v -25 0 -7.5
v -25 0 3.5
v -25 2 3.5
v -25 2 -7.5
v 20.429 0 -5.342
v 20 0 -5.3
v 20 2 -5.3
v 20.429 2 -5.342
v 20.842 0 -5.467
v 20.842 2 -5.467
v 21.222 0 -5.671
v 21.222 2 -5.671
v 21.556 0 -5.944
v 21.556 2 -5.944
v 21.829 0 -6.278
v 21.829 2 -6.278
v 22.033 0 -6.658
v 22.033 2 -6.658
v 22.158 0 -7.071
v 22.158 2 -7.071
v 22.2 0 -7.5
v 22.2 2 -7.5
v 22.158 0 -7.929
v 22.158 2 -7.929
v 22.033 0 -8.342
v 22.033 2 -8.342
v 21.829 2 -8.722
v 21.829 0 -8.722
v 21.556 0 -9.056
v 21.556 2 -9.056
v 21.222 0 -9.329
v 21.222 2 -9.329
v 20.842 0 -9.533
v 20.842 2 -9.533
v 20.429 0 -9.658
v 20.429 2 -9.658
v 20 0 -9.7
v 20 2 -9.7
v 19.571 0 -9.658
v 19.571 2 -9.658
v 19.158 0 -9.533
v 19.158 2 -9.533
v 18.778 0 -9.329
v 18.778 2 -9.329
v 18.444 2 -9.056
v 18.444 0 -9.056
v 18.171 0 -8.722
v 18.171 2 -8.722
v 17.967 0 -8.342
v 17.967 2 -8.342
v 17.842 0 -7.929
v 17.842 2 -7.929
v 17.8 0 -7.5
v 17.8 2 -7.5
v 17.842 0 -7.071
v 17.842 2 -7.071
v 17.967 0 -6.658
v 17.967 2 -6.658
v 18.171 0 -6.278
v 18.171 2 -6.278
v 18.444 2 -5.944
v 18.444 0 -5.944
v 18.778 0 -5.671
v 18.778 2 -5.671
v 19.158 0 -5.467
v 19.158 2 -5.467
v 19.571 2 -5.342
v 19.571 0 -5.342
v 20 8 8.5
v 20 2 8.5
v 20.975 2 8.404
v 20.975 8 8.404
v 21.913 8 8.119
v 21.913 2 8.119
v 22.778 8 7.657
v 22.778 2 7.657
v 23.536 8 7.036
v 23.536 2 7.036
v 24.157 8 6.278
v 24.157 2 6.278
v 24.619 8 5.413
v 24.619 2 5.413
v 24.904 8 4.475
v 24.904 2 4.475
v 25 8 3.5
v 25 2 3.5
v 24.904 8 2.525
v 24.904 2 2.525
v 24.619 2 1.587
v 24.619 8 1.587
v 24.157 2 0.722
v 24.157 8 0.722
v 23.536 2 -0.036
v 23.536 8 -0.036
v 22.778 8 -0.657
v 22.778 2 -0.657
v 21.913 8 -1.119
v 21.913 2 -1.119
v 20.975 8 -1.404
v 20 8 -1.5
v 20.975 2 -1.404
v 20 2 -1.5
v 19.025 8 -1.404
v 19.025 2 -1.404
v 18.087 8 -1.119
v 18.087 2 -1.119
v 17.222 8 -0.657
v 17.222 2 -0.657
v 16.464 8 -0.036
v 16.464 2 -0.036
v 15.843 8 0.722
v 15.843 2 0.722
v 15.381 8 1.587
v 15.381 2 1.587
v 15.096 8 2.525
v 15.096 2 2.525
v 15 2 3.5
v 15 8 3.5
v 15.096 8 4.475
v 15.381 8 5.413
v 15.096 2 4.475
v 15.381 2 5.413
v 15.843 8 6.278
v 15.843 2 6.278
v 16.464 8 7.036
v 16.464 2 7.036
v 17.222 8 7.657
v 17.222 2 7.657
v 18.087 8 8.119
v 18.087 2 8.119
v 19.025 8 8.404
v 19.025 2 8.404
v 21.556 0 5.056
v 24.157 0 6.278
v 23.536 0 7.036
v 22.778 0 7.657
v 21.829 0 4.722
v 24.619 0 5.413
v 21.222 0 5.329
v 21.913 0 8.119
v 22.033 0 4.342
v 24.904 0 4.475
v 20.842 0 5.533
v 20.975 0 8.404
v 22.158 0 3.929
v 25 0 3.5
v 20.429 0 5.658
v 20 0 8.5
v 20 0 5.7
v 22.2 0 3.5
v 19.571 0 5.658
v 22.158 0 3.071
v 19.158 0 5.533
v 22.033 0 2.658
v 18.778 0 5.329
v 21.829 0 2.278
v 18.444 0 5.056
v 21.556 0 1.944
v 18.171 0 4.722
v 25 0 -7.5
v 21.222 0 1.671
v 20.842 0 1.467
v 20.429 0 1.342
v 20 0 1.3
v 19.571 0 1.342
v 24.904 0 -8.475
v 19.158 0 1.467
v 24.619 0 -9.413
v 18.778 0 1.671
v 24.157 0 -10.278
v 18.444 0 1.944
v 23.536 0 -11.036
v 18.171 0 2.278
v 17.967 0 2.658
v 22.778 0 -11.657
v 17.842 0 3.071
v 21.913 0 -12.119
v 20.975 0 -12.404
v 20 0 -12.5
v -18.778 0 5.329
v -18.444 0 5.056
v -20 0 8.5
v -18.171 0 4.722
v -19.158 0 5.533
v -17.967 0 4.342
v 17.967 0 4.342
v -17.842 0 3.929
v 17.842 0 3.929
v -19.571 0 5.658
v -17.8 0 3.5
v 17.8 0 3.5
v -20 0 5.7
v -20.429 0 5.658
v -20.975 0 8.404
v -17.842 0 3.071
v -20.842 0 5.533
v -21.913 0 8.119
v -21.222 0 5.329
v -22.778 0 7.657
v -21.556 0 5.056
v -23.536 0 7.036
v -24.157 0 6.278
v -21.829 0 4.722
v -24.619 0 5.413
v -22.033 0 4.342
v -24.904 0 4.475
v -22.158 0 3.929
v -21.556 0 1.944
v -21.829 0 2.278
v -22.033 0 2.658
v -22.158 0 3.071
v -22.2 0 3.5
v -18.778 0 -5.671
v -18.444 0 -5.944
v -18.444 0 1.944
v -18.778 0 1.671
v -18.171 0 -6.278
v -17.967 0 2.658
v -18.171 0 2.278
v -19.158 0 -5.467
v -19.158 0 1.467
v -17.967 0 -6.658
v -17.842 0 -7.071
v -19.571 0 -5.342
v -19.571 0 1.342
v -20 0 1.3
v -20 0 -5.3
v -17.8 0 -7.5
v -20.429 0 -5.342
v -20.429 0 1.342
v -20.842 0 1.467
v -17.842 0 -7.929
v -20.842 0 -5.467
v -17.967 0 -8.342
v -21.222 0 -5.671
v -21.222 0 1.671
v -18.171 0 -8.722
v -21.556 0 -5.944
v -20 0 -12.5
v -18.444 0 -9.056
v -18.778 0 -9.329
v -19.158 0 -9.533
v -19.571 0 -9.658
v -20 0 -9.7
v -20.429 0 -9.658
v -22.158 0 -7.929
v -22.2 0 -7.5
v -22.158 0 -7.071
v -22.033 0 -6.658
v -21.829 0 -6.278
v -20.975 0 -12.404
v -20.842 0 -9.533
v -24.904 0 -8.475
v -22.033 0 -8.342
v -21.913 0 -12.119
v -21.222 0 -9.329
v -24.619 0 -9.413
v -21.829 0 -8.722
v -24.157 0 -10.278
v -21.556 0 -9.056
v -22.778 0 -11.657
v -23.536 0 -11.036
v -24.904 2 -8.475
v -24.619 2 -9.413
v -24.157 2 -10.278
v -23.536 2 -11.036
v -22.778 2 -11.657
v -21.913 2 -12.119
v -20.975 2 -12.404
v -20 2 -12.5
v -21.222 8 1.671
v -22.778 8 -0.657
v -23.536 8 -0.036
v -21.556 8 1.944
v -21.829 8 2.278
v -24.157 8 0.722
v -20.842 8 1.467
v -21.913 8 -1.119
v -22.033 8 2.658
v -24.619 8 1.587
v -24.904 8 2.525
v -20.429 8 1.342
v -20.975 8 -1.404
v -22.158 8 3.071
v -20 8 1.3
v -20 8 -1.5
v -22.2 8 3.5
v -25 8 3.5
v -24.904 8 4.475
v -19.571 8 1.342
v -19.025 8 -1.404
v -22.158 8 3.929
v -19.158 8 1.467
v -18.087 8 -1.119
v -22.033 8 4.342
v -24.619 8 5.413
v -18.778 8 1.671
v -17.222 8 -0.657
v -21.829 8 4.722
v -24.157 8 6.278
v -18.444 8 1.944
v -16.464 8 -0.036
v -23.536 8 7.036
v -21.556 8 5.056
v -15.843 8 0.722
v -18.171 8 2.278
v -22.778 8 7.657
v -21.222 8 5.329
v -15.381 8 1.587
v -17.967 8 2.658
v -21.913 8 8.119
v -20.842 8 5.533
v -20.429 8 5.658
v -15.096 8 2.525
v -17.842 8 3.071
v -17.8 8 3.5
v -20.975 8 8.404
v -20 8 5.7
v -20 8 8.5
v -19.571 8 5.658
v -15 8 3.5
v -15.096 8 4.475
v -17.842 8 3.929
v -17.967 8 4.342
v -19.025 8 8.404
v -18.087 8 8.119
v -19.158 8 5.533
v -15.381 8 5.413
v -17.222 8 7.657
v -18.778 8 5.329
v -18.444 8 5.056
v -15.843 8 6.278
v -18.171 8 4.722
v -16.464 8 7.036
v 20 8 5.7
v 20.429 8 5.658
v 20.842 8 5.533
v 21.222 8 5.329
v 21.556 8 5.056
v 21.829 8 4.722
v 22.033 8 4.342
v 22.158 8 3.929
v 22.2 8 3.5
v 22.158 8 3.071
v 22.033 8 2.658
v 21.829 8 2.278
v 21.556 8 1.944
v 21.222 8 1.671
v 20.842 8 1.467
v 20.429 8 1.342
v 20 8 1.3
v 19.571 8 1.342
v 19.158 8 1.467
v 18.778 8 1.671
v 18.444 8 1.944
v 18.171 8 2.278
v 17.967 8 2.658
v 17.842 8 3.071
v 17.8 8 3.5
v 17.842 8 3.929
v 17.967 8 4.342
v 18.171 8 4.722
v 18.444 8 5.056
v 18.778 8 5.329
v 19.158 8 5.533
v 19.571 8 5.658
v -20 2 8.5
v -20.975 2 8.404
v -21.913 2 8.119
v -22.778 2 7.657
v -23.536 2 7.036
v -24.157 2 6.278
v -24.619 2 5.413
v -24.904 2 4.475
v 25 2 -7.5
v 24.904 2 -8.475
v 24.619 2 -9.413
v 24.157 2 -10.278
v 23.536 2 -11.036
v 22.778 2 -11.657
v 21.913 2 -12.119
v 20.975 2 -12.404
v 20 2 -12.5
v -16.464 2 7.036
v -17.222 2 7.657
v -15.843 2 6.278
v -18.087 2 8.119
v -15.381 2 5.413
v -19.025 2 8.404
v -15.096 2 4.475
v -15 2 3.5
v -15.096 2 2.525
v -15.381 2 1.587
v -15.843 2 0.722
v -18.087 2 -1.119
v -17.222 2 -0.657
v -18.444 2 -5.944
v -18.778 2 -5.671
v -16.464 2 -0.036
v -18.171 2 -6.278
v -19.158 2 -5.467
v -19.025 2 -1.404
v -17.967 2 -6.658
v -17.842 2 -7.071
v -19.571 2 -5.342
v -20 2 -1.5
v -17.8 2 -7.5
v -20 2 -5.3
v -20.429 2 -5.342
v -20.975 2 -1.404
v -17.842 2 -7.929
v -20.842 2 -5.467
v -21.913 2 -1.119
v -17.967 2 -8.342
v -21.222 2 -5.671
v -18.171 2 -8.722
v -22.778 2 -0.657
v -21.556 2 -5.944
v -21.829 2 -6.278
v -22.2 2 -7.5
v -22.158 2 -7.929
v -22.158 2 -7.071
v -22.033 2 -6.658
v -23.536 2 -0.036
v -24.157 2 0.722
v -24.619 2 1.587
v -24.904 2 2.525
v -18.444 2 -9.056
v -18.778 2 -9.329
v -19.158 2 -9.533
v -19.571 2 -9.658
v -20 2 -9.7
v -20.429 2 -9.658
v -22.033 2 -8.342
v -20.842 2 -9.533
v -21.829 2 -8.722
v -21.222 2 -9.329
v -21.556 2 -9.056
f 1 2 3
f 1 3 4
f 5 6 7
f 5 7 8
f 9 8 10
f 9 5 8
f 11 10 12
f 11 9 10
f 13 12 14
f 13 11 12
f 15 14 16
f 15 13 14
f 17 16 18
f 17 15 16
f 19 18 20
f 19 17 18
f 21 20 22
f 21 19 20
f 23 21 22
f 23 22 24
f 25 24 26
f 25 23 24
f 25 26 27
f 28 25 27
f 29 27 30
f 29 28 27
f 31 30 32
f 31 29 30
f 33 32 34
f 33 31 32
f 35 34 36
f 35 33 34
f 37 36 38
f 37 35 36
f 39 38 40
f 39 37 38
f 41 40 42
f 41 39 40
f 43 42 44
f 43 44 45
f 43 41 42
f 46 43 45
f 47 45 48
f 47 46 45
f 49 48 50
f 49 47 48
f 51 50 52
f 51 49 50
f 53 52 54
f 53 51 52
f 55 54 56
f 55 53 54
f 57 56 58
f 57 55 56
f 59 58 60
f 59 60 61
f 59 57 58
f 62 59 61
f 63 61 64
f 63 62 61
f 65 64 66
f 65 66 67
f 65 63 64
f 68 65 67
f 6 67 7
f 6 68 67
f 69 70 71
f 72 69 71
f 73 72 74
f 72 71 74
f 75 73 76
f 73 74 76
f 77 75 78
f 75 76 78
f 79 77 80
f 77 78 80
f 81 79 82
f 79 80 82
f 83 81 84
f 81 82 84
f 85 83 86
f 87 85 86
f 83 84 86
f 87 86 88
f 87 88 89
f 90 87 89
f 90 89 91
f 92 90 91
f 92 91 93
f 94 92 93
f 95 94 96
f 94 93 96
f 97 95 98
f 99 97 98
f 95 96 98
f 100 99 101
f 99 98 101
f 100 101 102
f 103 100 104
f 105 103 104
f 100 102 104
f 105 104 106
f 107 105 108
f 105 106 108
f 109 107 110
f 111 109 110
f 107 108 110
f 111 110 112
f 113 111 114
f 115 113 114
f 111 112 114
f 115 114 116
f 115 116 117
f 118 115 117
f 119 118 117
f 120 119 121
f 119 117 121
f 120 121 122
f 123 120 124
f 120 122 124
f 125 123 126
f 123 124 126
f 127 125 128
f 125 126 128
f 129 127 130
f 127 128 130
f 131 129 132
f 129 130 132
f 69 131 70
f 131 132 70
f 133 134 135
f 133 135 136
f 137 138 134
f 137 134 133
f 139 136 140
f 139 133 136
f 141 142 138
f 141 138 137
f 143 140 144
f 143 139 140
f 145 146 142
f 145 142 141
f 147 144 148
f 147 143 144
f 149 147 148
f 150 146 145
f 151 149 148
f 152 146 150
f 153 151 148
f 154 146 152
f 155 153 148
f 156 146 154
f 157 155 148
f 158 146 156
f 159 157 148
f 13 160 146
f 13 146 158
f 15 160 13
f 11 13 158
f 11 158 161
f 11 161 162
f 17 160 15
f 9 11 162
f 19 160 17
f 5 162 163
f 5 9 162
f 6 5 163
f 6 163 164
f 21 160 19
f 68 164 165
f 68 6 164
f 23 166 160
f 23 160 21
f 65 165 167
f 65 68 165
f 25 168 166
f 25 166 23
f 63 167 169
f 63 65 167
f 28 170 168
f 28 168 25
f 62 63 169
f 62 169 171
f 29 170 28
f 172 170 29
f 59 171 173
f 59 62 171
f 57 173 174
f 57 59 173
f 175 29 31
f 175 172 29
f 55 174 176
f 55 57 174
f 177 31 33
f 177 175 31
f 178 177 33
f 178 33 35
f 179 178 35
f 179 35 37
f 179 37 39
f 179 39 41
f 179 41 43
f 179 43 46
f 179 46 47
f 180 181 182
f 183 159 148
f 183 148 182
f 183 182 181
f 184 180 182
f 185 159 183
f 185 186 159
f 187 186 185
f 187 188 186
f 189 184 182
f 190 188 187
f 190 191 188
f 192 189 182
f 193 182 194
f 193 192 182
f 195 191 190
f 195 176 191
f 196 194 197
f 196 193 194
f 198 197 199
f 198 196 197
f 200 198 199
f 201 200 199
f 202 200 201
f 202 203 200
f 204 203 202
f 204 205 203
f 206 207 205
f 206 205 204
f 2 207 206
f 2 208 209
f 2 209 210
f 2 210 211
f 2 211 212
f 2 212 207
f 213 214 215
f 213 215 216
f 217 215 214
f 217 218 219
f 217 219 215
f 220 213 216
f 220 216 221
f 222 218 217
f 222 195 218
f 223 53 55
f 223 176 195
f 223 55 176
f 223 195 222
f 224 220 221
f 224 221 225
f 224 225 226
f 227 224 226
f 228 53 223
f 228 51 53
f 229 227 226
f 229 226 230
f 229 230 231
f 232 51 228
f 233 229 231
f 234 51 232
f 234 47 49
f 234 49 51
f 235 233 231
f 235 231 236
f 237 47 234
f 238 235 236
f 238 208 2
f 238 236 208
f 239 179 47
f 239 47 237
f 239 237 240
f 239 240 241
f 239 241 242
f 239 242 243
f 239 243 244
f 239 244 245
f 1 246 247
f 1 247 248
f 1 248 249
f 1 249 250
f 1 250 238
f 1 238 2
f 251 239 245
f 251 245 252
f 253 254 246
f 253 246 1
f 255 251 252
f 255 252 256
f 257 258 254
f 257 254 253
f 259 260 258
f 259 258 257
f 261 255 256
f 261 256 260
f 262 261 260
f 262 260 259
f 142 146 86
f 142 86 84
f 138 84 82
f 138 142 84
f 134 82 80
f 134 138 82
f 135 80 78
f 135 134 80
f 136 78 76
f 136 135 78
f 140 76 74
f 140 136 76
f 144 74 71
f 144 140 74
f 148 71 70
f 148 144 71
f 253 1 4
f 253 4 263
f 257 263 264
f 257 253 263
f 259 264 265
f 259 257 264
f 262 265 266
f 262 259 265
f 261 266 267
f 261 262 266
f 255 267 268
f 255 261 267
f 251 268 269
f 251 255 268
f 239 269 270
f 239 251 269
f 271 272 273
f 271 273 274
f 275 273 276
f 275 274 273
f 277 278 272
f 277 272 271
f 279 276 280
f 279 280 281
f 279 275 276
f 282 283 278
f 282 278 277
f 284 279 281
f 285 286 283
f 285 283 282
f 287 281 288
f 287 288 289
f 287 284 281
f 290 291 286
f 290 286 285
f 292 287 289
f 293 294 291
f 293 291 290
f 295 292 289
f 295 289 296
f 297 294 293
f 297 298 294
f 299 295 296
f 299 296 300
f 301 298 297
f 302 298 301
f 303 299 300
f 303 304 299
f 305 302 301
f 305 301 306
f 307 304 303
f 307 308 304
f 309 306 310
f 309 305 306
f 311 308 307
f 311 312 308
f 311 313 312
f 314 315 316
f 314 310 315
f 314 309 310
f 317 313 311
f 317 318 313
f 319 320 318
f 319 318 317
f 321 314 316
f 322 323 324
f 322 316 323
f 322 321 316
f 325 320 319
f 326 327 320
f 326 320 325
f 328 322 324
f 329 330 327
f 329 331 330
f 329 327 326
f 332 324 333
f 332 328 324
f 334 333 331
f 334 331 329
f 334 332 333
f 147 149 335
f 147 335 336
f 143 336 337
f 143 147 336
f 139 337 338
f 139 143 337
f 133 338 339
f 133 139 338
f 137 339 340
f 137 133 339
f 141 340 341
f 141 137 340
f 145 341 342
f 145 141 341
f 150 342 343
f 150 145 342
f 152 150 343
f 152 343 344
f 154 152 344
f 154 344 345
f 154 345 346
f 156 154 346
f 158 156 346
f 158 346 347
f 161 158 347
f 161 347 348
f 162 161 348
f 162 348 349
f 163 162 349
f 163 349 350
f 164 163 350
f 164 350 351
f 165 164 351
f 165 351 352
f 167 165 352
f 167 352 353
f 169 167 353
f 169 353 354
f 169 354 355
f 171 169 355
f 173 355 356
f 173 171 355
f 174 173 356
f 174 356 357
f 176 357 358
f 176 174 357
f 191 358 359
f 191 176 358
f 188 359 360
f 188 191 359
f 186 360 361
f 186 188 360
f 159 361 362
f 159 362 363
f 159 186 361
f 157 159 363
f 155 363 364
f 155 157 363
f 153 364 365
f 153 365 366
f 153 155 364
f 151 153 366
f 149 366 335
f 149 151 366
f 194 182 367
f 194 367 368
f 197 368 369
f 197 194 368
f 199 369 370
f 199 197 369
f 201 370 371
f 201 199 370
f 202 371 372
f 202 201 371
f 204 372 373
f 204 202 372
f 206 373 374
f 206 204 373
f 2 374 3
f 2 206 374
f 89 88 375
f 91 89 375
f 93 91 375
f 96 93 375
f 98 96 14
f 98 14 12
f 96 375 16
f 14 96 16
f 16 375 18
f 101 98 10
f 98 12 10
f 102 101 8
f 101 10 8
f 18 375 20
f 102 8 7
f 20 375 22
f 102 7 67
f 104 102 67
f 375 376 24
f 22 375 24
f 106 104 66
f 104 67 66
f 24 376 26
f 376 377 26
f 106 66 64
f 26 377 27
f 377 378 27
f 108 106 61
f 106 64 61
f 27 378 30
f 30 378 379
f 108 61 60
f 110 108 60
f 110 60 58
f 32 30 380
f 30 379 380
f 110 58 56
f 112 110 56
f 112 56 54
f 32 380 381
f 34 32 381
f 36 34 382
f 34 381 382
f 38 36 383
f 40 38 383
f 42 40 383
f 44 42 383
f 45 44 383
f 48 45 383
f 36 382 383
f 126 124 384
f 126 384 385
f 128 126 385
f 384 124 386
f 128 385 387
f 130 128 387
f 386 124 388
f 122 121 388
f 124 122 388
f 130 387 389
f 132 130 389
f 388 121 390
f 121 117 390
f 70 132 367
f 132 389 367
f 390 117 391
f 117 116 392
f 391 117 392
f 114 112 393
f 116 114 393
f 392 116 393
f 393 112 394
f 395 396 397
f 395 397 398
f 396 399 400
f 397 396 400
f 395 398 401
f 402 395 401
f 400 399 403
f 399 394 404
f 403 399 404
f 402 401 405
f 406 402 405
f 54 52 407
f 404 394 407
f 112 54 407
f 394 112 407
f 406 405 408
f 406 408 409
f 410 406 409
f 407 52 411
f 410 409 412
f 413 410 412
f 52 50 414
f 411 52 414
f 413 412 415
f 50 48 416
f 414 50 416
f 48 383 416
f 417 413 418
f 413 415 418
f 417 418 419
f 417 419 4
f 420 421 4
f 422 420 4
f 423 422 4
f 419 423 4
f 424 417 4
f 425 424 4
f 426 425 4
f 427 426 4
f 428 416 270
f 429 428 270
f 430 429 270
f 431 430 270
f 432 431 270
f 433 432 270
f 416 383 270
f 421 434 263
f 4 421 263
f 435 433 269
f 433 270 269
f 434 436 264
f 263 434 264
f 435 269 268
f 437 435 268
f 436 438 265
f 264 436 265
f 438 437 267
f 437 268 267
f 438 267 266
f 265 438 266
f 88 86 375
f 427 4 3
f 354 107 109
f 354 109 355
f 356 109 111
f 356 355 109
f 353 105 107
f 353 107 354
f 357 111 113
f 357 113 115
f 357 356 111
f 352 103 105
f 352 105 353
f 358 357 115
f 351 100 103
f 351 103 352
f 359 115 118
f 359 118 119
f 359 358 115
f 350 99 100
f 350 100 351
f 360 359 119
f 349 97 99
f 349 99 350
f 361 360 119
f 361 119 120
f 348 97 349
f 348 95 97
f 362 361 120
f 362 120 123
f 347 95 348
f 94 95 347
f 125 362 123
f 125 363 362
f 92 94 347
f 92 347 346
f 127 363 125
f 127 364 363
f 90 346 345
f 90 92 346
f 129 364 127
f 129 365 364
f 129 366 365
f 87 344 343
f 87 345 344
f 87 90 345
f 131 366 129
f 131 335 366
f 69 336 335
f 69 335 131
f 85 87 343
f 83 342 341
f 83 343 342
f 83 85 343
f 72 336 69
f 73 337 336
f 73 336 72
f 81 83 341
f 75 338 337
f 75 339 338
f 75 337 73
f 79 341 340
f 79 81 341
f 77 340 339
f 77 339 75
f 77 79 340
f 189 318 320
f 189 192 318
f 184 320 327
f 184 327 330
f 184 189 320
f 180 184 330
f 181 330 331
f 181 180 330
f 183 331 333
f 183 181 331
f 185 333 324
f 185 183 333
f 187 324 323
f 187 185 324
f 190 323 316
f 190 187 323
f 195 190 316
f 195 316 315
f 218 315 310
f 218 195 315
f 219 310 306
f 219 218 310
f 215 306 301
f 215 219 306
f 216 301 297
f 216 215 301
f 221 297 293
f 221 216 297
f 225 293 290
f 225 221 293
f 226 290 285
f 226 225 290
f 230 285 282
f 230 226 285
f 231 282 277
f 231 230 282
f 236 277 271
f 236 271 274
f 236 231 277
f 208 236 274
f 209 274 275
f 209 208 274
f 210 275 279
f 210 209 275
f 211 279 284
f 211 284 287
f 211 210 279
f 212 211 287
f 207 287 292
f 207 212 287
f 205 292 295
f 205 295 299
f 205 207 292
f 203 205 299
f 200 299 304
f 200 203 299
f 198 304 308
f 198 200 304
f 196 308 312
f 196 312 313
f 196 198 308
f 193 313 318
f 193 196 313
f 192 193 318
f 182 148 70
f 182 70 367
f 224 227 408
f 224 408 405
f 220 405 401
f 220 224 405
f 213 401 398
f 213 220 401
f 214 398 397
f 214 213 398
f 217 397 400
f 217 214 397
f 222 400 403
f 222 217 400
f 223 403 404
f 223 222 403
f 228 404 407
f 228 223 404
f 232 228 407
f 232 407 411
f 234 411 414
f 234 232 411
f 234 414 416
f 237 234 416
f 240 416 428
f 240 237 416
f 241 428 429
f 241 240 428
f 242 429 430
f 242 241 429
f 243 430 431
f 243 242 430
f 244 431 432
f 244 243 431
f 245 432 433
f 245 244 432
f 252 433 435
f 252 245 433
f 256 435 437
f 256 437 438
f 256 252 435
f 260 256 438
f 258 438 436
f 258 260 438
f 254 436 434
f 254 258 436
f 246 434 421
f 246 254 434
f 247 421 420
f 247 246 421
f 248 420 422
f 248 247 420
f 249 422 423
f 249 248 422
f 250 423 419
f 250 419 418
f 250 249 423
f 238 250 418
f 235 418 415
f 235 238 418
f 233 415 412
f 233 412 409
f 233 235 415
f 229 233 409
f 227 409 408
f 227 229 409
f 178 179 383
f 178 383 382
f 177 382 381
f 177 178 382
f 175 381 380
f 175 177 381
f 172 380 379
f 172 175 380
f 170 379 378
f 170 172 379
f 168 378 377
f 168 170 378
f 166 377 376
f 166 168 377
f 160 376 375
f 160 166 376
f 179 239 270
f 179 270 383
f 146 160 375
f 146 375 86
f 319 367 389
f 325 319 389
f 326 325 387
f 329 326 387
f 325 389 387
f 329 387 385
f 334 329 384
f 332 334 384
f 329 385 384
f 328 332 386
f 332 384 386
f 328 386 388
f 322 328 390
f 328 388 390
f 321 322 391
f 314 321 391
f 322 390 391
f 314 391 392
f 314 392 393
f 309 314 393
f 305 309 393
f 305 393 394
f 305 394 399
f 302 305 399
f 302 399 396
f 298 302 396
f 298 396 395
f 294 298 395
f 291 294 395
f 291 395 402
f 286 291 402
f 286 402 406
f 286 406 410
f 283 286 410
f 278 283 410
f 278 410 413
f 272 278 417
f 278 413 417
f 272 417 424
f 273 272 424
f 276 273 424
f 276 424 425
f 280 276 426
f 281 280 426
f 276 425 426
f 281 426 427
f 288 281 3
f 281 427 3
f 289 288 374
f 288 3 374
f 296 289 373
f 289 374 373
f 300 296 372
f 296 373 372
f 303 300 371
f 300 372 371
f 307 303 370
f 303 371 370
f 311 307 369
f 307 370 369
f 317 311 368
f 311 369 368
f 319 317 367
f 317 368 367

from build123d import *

# Parameters (mm, degrees)
SKETCH_1_R      = 2.2
EXTRUDE_1_DEPTH = 2
SKETCH_2_R      = 5
SKETCH_2_R_2    = 2.2
EXTRUDE_3_DEPTH = 6


with BuildPart() as part:
    # 草图1 → 凸台-拉伸1 (new body)
    with BuildSketch(Plane(origin=(0, 0, 0), x_dir=(1, 0, 0), z_dir=(0, 1, 0))):
        with BuildLine():
            Line((-20, 12.5), (20, 12.5))
            ThreePointArc((20, 12.5), (23.535533906, 11.035533906), (25, 7.5))
            Line((25, 7.5), (25, -3.5))
            ThreePointArc((25, -3.5), (23.535533906, -7.035533906), (20, -8.5))
            Line((20, -8.5), (-20, -8.5))
            ThreePointArc((-20, -8.5), (-23.535533906, -7.035533906), (-25, -3.5))
            Line((-25, -3.5), (-25, 7.5))
            ThreePointArc((-25, 7.5), (-23.535533906, 11.035533906), (-20, 12.5))
        make_face()
        with Locations(Location((20, 7.5, 0), (0, 0, 270))):
            Circle(SKETCH_1_R, mode=Mode.SUBTRACT)
        with Locations(Location((-20, 7.5, 0), (0, 0, 270))):
            Circle(SKETCH_1_R, mode=Mode.SUBTRACT)
        with Locations(Location((20, -3.5, 0), (0, 0, 270))):
            Circle(SKETCH_1_R, mode=Mode.SUBTRACT)
        with Locations(Location((-20, -3.5, 0), (0, 0, 270))):
            Circle(SKETCH_1_R, mode=Mode.SUBTRACT)
    extrude(amount=EXTRUDE_1_DEPTH)

    # 草图2 → 凸台-拉伸3 (add)
    # profile 1 of 2: a face of its own
    with BuildSketch(Plane(origin=(0, 2, 0), x_dir=(1, 0, 0), z_dir=(0, 1, 0))):
        with Locations(Location((-20, -3.5, 0), (0, 0, 270))):
            Circle(SKETCH_2_R)
        with Locations(Location((-20, -3.5, 0), (0, 0, 270))):
            Circle(SKETCH_2_R_2, mode=Mode.SUBTRACT)
    # profile 2 of 2: a face of its own
    with BuildSketch(Plane(origin=(0, 2, 0), x_dir=(1, 0, 0), z_dir=(0, 1, 0))):
        with Locations(Location((20, -3.5, 0), (0, 0, 270))):
            Circle(SKETCH_2_R)
        with Locations(Location((20, -3.5, 0), (0, 0, 270))):
            Circle(SKETCH_2_R_2, mode=Mode.SUBTRACT)
    extrude(amount=EXTRUDE_3_DEPTH)


solid = part.part
